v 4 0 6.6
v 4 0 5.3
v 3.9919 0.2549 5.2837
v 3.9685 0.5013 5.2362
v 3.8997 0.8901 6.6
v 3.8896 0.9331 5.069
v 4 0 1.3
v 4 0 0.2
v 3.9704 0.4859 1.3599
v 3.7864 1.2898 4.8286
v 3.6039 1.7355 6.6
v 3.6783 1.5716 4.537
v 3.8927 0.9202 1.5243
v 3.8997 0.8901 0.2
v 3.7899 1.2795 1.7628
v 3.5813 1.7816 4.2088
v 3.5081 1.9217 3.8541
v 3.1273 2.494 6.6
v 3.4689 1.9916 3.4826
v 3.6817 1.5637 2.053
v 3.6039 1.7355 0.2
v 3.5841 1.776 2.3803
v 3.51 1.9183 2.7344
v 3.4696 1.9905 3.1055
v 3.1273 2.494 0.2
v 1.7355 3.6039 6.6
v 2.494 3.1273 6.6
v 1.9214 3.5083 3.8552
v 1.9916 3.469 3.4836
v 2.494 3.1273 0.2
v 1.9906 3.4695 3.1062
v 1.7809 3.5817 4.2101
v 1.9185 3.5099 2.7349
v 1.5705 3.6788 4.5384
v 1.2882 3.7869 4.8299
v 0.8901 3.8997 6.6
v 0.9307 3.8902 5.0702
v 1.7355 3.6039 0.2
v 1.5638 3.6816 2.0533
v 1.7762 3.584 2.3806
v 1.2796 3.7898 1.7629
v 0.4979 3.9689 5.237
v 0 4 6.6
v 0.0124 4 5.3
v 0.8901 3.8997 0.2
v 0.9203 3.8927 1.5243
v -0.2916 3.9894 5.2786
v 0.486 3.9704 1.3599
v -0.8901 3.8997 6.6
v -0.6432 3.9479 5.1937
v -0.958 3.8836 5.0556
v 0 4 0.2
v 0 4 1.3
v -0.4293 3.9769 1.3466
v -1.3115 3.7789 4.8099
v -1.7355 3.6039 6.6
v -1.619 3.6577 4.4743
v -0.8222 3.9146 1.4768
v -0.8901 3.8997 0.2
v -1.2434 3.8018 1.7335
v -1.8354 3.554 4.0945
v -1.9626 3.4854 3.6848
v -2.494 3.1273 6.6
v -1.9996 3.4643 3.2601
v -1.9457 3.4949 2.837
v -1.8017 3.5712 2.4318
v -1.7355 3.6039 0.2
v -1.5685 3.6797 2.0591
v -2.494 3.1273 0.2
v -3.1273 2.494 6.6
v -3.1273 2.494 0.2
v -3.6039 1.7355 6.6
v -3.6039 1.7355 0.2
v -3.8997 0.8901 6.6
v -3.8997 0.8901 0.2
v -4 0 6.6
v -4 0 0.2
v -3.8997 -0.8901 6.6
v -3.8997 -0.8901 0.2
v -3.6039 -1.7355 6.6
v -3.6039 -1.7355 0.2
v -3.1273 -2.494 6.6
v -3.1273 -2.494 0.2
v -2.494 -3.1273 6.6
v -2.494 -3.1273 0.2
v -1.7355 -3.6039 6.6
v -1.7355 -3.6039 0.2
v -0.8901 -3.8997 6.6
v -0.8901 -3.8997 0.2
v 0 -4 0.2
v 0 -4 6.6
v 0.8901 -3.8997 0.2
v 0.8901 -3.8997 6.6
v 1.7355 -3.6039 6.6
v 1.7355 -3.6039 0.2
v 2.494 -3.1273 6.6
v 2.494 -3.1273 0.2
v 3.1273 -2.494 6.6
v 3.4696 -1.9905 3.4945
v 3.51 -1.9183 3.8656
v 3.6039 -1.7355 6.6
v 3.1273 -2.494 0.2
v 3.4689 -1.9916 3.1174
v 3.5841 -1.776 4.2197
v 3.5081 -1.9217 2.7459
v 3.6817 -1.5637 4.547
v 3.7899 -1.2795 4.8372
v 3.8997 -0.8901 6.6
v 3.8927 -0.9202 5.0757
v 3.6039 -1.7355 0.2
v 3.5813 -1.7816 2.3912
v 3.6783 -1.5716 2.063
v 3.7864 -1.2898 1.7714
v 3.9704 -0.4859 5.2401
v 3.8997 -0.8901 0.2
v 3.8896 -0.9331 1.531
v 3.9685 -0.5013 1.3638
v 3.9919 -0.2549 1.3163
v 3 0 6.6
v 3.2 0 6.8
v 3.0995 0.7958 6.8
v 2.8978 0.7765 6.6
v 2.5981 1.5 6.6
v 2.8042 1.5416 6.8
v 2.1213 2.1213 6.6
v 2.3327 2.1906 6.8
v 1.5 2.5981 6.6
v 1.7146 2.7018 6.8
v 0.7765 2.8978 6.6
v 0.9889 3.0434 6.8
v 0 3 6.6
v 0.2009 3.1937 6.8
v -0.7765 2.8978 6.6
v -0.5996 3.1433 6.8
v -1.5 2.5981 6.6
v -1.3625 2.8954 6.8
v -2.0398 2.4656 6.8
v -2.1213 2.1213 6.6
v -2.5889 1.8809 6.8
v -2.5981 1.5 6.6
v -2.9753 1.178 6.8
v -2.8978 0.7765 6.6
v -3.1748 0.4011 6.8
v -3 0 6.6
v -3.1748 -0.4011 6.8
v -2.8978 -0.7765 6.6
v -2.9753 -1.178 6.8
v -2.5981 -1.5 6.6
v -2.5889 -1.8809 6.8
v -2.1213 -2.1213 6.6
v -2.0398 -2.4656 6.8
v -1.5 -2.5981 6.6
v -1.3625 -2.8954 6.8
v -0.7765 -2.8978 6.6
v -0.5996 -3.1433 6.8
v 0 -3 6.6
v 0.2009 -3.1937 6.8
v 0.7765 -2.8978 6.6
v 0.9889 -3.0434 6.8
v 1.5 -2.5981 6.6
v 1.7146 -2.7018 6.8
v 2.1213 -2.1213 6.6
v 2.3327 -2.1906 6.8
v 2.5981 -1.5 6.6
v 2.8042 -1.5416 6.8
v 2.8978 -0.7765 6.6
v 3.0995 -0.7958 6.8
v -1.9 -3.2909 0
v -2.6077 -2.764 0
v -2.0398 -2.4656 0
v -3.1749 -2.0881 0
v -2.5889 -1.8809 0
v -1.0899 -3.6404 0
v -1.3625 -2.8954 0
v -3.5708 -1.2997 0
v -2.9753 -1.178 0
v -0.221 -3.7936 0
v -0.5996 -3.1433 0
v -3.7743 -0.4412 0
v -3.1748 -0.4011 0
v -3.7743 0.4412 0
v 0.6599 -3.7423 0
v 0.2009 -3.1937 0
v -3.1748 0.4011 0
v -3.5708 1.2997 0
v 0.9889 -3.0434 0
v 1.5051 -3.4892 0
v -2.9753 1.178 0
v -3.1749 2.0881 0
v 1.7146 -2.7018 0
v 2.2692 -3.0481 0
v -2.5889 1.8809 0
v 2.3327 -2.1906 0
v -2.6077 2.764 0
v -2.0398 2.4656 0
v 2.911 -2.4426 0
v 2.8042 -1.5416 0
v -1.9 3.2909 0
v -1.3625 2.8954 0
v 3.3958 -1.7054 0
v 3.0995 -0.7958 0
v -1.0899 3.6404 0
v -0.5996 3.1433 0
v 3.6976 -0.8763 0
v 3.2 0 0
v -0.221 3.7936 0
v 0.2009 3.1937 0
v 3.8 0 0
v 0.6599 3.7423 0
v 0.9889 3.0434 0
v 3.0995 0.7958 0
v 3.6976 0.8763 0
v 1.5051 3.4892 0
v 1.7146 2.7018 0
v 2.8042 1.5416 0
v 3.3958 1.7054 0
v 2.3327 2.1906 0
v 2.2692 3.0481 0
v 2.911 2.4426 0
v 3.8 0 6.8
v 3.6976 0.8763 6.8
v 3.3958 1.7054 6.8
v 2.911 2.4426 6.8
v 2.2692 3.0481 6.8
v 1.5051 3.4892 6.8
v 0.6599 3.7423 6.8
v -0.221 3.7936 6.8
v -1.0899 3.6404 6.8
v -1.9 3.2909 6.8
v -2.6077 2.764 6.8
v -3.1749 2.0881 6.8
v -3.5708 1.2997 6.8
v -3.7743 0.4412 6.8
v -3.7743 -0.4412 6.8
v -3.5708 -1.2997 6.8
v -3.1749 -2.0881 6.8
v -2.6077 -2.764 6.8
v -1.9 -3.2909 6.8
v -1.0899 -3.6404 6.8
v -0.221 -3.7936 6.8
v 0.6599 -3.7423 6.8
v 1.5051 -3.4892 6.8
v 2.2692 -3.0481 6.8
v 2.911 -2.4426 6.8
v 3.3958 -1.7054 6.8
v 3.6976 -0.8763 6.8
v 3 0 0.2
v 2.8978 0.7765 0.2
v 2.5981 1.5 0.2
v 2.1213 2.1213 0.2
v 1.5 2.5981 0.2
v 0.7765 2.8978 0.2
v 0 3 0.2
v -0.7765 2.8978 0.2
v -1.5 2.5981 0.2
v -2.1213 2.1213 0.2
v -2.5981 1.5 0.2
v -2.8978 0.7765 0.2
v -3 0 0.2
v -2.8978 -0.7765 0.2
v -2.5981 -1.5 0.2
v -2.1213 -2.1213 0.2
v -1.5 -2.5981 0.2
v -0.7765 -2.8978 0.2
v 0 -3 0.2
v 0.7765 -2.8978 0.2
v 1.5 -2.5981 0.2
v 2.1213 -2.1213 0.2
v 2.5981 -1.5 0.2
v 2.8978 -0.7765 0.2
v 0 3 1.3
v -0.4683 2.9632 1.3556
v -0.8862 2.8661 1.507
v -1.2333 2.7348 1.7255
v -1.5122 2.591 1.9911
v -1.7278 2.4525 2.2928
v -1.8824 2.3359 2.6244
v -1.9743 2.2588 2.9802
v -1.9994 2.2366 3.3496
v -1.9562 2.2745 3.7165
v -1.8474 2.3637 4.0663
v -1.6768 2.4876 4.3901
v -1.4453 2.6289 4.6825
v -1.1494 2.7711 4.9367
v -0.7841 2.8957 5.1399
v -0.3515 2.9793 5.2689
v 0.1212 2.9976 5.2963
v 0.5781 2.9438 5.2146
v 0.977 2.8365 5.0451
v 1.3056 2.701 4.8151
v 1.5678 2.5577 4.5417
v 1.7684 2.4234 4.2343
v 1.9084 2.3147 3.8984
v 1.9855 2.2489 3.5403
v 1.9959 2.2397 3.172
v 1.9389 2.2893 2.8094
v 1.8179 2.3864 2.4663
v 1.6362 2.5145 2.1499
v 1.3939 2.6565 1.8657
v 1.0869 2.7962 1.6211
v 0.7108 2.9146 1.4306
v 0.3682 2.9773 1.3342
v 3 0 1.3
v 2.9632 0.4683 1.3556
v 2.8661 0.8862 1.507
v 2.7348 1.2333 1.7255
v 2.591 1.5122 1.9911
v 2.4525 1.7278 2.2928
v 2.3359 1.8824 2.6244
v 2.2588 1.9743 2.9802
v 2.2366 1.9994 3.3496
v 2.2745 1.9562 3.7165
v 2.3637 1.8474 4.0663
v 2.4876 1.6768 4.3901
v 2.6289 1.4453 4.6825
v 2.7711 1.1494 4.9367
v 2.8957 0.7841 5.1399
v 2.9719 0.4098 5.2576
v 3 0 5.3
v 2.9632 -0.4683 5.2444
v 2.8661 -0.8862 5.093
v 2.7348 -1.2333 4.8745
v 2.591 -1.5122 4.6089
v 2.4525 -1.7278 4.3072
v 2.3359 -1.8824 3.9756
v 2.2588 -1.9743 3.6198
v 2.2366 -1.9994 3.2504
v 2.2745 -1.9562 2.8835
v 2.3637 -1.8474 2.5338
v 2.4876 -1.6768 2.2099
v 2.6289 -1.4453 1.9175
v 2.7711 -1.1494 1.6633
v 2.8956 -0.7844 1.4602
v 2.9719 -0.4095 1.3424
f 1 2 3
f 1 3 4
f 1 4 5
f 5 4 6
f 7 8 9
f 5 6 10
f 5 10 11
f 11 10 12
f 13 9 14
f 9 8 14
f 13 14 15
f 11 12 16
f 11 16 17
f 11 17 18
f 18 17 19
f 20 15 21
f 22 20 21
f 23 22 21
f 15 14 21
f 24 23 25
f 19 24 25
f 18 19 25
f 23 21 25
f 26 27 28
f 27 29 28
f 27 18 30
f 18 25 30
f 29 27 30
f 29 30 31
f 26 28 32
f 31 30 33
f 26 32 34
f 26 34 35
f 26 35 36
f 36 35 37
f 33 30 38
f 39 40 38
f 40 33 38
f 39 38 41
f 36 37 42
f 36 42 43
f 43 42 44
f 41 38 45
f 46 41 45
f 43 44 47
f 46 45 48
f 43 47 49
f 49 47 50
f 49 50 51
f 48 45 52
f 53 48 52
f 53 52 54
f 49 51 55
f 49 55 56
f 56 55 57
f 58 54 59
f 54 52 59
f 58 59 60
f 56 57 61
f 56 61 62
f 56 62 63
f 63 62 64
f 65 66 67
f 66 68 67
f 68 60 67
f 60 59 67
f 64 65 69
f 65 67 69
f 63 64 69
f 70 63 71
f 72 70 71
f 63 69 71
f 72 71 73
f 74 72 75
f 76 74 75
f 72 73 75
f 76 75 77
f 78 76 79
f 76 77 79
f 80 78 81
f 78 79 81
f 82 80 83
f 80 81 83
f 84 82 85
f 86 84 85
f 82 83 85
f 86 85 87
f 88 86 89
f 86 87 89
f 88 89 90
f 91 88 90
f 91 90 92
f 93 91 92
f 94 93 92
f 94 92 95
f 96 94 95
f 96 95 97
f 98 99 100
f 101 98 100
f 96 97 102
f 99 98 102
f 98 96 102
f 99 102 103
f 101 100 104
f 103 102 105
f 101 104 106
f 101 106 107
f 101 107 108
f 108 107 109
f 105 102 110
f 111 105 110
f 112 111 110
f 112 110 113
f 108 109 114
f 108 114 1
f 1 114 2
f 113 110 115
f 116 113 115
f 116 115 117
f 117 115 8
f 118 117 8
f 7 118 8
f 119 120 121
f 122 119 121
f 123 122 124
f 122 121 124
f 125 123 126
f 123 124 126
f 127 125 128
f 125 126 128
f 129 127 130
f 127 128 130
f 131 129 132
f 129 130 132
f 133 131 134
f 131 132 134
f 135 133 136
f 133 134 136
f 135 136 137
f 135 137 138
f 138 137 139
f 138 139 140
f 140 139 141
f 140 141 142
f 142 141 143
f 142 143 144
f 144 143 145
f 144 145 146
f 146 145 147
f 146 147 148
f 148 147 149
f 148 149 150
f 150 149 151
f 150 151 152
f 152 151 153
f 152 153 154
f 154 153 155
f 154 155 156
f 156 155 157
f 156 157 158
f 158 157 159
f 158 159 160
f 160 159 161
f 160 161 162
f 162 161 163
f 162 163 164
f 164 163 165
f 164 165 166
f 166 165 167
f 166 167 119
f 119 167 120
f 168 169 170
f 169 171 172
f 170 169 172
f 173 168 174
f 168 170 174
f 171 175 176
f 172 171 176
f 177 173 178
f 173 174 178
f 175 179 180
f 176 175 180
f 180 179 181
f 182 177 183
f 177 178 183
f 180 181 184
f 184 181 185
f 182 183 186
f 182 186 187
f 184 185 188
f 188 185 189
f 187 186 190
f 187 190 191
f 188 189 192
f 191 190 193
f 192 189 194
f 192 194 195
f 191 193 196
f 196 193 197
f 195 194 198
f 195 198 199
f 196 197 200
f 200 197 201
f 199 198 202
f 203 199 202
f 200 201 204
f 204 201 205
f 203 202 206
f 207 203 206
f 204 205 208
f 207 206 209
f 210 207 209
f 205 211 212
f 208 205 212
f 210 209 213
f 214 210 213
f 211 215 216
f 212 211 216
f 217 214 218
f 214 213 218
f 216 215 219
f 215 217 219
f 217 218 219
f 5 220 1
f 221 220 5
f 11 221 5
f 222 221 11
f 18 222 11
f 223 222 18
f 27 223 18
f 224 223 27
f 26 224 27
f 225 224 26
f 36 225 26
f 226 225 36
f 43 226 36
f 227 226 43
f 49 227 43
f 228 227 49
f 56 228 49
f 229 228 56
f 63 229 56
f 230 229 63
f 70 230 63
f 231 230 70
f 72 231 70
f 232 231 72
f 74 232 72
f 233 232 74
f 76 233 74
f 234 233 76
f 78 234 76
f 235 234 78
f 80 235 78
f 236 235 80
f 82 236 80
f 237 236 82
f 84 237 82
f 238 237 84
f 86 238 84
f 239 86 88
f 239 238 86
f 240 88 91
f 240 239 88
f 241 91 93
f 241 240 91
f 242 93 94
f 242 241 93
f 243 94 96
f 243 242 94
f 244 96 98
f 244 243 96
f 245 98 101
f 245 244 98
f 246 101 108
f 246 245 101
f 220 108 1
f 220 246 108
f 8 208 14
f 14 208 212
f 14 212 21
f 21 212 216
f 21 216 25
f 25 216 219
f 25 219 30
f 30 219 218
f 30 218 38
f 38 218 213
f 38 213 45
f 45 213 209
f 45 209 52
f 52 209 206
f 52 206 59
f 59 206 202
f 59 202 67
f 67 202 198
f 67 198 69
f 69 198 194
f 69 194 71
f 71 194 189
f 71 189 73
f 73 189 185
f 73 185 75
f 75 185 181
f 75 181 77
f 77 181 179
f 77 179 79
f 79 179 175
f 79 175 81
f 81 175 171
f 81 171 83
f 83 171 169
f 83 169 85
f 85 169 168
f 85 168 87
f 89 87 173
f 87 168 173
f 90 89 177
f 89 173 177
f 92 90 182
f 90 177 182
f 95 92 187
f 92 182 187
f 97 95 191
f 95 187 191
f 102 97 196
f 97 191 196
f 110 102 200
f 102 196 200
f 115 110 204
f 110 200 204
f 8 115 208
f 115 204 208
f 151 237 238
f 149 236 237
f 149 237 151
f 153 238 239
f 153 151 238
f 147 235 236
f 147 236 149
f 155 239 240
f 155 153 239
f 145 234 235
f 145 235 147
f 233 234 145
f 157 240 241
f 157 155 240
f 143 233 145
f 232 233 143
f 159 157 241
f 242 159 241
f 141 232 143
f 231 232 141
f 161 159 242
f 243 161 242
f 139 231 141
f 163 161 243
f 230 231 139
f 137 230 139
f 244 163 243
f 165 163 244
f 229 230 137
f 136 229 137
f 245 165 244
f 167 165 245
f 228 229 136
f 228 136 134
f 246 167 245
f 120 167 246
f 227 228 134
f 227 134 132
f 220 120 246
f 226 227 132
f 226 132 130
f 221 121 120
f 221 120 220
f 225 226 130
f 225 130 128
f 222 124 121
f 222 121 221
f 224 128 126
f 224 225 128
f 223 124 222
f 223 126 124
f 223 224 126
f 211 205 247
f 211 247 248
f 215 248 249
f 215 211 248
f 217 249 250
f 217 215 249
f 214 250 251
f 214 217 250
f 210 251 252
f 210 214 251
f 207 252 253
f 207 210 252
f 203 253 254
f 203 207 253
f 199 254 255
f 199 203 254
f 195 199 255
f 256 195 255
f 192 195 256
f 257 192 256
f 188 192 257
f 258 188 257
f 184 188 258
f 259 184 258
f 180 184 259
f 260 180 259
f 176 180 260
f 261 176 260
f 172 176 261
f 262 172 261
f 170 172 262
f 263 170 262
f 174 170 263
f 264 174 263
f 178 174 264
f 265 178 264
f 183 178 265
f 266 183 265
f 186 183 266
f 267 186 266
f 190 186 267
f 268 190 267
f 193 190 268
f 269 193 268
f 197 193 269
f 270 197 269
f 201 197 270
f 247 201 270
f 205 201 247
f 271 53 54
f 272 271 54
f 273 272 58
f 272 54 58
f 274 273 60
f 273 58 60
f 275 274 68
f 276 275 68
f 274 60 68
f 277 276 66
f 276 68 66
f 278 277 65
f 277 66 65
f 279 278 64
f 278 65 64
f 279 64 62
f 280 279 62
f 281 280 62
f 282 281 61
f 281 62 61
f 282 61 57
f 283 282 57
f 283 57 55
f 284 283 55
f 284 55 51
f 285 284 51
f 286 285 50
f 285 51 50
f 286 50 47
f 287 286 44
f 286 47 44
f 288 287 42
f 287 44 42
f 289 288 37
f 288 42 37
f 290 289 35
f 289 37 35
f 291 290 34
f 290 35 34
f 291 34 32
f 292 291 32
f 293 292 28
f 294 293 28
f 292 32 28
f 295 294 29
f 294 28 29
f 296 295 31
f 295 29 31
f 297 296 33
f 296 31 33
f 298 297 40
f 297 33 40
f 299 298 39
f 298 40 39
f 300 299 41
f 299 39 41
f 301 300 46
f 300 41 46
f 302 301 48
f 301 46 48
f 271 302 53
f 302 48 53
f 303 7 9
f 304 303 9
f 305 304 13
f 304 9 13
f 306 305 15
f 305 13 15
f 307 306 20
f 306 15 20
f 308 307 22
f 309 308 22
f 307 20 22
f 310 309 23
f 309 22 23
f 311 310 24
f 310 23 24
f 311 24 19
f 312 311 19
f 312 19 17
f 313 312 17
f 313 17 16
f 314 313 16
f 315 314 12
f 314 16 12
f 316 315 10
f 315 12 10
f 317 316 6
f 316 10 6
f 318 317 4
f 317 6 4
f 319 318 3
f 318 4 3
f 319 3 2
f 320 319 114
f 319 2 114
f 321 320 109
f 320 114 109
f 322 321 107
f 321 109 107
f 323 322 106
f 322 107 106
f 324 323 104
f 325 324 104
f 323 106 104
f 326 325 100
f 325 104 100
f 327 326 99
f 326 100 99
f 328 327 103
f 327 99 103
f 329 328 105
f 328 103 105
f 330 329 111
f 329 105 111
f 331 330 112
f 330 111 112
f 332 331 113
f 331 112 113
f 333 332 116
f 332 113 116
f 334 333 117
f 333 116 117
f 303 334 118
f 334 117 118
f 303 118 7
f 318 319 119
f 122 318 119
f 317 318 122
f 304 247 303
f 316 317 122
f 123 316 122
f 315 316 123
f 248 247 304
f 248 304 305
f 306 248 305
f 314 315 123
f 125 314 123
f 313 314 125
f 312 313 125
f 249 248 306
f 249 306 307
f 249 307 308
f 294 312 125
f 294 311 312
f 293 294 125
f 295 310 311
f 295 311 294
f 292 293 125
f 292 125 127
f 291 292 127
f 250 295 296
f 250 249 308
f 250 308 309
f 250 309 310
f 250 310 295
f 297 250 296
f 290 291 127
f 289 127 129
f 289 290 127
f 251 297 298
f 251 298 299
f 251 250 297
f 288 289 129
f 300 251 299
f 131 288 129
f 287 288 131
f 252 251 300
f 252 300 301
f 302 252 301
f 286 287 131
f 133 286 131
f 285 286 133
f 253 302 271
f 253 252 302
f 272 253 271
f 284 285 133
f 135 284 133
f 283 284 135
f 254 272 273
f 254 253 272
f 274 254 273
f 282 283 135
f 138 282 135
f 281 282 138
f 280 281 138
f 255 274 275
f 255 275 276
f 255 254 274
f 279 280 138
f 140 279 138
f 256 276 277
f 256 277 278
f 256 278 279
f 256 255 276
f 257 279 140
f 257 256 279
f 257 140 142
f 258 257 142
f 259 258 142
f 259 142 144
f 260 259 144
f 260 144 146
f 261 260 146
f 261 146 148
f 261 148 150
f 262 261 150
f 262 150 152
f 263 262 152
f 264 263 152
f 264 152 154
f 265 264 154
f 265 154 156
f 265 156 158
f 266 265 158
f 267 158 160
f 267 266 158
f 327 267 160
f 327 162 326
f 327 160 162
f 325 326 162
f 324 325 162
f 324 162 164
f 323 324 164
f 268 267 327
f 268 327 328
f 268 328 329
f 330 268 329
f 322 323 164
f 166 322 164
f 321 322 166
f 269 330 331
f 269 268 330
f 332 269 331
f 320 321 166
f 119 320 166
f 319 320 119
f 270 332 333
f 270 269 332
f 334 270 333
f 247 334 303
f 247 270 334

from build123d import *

# Parameters (mm, degrees)
SKETCH1_R               = 4
SKETCH1_R_2             = 3
BOSS_EXTRUDE1_DEPTH     = 6.8
CHAMFER1_SIZE           = 0.2
CUT_EXTRUDE1_REACH      = 13.236
CUT_EXTRUDE1_END_RADIUS = 3
SKETCH2_R               = 2
CIRPATTERN1_COUNT       = 2
CIRPATTERN1_ANGLE       = 90


with BuildPart() as part:
    # Sketch1 → Boss-Extrude1 (new body)
    with BuildSketch(Plane.XY):
        Circle(SKETCH1_R)
        Circle(SKETCH1_R_2, mode=Mode.SUBTRACT)
    extrude(amount=BOSS_EXTRUDE1_DEPTH)

    # Chamfer1
    chamfer1_edges = [part.edges().sort_by_distance(p)[0] for p in [
        (-4, 0, 0),
        (-4, 0, 6.8),
        (-3, 0, 0),
        (-3, 0, 6.8),
    ]]
    chamfer(chamfer1_edges, length=CHAMFER1_SIZE)

    # Cut-Extrude1: up to this cylinder (the profile starts outside it)
    cut_extrude1_end = Plane(origin=(0, 0, 3.3), z_dir=(0, 0, -1)) * Cylinder(CUT_EXTRUDE1_END_RADIUS, 33.472, mode=Mode.PRIVATE)
    # Sketch2 → Cut-Extrude1 (cut, up to the surface)
    with BuildSketch(Plane(origin=(4, 0, 0), x_dir=(0, 0, -1), z_dir=(1, 0, 0)), mode=Mode.PRIVATE) as cut_extrude1_sk1:
        with Locations((-3.3, 0)):
            Circle(SKETCH2_R)
    cut_extrude1_tool1 = extrude(cut_extrude1_sk1.sketch, amount=-CUT_EXTRUDE1_REACH, mode=Mode.PRIVATE) - cut_extrude1_end
    cut_extrude1 = cut_extrude1_tool1.solids().sort_by_distance((4, 0, 3.3))[0]
    add(cut_extrude1, mode=Mode.SUBTRACT)

    # CirPattern1: Cut-Extrude1 ×2 about axis
    cirpattern1_axis = Axis((0, 0, 6.6), (0, 0, 1))
    for i in range(1, CIRPATTERN1_COUNT):
        add(cut_extrude1.rotate(cirpattern1_axis, i * CIRPATTERN1_ANGLE / (CIRPATTERN1_COUNT - 1)), mode=Mode.SUBTRACT)


solid = part.part
